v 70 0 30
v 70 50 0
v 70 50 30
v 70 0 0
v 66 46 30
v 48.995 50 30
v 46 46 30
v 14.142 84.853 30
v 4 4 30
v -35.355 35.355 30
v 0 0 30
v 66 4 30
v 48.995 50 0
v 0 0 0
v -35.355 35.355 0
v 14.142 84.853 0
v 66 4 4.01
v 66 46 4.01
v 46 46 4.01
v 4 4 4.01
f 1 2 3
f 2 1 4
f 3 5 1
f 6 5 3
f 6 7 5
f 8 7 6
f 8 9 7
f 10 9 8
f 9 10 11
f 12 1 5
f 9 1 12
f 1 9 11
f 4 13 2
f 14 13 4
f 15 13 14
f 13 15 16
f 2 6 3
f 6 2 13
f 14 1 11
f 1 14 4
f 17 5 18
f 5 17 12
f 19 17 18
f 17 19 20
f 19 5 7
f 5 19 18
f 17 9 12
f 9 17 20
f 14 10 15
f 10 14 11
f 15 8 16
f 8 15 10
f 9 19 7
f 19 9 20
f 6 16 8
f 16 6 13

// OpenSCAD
// INCOMPLETE

// ===== Normal Variables
// # of short side "units" [ct]
x_buckets = 2;
// # of long side "units" [ct]
y_buckets = 2;
// wall thickness [#mm]
outer_wall = 4;
inner_wall = 1;
// # of subdivision "buckets" across short side [ct]
x_subs = 2;
// # of subdivision "buckets" across long side [ct]
y_subs = 2;
// tolerance [#mm]
tol = 0.5;
// label [yes/no]
label = true; // true/false
// label position [short unit side/long unit side]
label_side = "x"; // x/y
// label height [#mm] (defines from the start of the label angle area to the bottom. e.g. the label tape is 6mm so might select 7mm as the height)
label_height = 7;
// label text [abcd123!@&]
label_text = "abcd123!@&";
// label text size [?]
label_text_size = 6;
// label angle [#degrees]
label_angle = 60;
// rim [#mm]
// rim = 5; // -- ?
// corners [#mm] (blank = normal corner, mm defines the corner length at top edge)
// corners = 5; // -- ?

// ===== Configuration (Probably just set these once ever)
division_w = 70; // This is the OUTSIDE long measurement of 1 box
division_d = 50; // This is the OUTSIDE short measurement of 1 box
division_h = 30; // This is the OUTSIDE height of 1 box

// ====== A
rerr = 0.01;

module box(w, d, h, wall) {
  difference() {
    cube([w, d, h]);

    translate([wall, wall, wall+rerr])
    cube([w-(wall*2), d-(wall*2), h]);
  }

  rotate([0, 0, 45])
  # cube([w, d, h]);
}


box(division_w, division_d, division_h, outer_wall);
